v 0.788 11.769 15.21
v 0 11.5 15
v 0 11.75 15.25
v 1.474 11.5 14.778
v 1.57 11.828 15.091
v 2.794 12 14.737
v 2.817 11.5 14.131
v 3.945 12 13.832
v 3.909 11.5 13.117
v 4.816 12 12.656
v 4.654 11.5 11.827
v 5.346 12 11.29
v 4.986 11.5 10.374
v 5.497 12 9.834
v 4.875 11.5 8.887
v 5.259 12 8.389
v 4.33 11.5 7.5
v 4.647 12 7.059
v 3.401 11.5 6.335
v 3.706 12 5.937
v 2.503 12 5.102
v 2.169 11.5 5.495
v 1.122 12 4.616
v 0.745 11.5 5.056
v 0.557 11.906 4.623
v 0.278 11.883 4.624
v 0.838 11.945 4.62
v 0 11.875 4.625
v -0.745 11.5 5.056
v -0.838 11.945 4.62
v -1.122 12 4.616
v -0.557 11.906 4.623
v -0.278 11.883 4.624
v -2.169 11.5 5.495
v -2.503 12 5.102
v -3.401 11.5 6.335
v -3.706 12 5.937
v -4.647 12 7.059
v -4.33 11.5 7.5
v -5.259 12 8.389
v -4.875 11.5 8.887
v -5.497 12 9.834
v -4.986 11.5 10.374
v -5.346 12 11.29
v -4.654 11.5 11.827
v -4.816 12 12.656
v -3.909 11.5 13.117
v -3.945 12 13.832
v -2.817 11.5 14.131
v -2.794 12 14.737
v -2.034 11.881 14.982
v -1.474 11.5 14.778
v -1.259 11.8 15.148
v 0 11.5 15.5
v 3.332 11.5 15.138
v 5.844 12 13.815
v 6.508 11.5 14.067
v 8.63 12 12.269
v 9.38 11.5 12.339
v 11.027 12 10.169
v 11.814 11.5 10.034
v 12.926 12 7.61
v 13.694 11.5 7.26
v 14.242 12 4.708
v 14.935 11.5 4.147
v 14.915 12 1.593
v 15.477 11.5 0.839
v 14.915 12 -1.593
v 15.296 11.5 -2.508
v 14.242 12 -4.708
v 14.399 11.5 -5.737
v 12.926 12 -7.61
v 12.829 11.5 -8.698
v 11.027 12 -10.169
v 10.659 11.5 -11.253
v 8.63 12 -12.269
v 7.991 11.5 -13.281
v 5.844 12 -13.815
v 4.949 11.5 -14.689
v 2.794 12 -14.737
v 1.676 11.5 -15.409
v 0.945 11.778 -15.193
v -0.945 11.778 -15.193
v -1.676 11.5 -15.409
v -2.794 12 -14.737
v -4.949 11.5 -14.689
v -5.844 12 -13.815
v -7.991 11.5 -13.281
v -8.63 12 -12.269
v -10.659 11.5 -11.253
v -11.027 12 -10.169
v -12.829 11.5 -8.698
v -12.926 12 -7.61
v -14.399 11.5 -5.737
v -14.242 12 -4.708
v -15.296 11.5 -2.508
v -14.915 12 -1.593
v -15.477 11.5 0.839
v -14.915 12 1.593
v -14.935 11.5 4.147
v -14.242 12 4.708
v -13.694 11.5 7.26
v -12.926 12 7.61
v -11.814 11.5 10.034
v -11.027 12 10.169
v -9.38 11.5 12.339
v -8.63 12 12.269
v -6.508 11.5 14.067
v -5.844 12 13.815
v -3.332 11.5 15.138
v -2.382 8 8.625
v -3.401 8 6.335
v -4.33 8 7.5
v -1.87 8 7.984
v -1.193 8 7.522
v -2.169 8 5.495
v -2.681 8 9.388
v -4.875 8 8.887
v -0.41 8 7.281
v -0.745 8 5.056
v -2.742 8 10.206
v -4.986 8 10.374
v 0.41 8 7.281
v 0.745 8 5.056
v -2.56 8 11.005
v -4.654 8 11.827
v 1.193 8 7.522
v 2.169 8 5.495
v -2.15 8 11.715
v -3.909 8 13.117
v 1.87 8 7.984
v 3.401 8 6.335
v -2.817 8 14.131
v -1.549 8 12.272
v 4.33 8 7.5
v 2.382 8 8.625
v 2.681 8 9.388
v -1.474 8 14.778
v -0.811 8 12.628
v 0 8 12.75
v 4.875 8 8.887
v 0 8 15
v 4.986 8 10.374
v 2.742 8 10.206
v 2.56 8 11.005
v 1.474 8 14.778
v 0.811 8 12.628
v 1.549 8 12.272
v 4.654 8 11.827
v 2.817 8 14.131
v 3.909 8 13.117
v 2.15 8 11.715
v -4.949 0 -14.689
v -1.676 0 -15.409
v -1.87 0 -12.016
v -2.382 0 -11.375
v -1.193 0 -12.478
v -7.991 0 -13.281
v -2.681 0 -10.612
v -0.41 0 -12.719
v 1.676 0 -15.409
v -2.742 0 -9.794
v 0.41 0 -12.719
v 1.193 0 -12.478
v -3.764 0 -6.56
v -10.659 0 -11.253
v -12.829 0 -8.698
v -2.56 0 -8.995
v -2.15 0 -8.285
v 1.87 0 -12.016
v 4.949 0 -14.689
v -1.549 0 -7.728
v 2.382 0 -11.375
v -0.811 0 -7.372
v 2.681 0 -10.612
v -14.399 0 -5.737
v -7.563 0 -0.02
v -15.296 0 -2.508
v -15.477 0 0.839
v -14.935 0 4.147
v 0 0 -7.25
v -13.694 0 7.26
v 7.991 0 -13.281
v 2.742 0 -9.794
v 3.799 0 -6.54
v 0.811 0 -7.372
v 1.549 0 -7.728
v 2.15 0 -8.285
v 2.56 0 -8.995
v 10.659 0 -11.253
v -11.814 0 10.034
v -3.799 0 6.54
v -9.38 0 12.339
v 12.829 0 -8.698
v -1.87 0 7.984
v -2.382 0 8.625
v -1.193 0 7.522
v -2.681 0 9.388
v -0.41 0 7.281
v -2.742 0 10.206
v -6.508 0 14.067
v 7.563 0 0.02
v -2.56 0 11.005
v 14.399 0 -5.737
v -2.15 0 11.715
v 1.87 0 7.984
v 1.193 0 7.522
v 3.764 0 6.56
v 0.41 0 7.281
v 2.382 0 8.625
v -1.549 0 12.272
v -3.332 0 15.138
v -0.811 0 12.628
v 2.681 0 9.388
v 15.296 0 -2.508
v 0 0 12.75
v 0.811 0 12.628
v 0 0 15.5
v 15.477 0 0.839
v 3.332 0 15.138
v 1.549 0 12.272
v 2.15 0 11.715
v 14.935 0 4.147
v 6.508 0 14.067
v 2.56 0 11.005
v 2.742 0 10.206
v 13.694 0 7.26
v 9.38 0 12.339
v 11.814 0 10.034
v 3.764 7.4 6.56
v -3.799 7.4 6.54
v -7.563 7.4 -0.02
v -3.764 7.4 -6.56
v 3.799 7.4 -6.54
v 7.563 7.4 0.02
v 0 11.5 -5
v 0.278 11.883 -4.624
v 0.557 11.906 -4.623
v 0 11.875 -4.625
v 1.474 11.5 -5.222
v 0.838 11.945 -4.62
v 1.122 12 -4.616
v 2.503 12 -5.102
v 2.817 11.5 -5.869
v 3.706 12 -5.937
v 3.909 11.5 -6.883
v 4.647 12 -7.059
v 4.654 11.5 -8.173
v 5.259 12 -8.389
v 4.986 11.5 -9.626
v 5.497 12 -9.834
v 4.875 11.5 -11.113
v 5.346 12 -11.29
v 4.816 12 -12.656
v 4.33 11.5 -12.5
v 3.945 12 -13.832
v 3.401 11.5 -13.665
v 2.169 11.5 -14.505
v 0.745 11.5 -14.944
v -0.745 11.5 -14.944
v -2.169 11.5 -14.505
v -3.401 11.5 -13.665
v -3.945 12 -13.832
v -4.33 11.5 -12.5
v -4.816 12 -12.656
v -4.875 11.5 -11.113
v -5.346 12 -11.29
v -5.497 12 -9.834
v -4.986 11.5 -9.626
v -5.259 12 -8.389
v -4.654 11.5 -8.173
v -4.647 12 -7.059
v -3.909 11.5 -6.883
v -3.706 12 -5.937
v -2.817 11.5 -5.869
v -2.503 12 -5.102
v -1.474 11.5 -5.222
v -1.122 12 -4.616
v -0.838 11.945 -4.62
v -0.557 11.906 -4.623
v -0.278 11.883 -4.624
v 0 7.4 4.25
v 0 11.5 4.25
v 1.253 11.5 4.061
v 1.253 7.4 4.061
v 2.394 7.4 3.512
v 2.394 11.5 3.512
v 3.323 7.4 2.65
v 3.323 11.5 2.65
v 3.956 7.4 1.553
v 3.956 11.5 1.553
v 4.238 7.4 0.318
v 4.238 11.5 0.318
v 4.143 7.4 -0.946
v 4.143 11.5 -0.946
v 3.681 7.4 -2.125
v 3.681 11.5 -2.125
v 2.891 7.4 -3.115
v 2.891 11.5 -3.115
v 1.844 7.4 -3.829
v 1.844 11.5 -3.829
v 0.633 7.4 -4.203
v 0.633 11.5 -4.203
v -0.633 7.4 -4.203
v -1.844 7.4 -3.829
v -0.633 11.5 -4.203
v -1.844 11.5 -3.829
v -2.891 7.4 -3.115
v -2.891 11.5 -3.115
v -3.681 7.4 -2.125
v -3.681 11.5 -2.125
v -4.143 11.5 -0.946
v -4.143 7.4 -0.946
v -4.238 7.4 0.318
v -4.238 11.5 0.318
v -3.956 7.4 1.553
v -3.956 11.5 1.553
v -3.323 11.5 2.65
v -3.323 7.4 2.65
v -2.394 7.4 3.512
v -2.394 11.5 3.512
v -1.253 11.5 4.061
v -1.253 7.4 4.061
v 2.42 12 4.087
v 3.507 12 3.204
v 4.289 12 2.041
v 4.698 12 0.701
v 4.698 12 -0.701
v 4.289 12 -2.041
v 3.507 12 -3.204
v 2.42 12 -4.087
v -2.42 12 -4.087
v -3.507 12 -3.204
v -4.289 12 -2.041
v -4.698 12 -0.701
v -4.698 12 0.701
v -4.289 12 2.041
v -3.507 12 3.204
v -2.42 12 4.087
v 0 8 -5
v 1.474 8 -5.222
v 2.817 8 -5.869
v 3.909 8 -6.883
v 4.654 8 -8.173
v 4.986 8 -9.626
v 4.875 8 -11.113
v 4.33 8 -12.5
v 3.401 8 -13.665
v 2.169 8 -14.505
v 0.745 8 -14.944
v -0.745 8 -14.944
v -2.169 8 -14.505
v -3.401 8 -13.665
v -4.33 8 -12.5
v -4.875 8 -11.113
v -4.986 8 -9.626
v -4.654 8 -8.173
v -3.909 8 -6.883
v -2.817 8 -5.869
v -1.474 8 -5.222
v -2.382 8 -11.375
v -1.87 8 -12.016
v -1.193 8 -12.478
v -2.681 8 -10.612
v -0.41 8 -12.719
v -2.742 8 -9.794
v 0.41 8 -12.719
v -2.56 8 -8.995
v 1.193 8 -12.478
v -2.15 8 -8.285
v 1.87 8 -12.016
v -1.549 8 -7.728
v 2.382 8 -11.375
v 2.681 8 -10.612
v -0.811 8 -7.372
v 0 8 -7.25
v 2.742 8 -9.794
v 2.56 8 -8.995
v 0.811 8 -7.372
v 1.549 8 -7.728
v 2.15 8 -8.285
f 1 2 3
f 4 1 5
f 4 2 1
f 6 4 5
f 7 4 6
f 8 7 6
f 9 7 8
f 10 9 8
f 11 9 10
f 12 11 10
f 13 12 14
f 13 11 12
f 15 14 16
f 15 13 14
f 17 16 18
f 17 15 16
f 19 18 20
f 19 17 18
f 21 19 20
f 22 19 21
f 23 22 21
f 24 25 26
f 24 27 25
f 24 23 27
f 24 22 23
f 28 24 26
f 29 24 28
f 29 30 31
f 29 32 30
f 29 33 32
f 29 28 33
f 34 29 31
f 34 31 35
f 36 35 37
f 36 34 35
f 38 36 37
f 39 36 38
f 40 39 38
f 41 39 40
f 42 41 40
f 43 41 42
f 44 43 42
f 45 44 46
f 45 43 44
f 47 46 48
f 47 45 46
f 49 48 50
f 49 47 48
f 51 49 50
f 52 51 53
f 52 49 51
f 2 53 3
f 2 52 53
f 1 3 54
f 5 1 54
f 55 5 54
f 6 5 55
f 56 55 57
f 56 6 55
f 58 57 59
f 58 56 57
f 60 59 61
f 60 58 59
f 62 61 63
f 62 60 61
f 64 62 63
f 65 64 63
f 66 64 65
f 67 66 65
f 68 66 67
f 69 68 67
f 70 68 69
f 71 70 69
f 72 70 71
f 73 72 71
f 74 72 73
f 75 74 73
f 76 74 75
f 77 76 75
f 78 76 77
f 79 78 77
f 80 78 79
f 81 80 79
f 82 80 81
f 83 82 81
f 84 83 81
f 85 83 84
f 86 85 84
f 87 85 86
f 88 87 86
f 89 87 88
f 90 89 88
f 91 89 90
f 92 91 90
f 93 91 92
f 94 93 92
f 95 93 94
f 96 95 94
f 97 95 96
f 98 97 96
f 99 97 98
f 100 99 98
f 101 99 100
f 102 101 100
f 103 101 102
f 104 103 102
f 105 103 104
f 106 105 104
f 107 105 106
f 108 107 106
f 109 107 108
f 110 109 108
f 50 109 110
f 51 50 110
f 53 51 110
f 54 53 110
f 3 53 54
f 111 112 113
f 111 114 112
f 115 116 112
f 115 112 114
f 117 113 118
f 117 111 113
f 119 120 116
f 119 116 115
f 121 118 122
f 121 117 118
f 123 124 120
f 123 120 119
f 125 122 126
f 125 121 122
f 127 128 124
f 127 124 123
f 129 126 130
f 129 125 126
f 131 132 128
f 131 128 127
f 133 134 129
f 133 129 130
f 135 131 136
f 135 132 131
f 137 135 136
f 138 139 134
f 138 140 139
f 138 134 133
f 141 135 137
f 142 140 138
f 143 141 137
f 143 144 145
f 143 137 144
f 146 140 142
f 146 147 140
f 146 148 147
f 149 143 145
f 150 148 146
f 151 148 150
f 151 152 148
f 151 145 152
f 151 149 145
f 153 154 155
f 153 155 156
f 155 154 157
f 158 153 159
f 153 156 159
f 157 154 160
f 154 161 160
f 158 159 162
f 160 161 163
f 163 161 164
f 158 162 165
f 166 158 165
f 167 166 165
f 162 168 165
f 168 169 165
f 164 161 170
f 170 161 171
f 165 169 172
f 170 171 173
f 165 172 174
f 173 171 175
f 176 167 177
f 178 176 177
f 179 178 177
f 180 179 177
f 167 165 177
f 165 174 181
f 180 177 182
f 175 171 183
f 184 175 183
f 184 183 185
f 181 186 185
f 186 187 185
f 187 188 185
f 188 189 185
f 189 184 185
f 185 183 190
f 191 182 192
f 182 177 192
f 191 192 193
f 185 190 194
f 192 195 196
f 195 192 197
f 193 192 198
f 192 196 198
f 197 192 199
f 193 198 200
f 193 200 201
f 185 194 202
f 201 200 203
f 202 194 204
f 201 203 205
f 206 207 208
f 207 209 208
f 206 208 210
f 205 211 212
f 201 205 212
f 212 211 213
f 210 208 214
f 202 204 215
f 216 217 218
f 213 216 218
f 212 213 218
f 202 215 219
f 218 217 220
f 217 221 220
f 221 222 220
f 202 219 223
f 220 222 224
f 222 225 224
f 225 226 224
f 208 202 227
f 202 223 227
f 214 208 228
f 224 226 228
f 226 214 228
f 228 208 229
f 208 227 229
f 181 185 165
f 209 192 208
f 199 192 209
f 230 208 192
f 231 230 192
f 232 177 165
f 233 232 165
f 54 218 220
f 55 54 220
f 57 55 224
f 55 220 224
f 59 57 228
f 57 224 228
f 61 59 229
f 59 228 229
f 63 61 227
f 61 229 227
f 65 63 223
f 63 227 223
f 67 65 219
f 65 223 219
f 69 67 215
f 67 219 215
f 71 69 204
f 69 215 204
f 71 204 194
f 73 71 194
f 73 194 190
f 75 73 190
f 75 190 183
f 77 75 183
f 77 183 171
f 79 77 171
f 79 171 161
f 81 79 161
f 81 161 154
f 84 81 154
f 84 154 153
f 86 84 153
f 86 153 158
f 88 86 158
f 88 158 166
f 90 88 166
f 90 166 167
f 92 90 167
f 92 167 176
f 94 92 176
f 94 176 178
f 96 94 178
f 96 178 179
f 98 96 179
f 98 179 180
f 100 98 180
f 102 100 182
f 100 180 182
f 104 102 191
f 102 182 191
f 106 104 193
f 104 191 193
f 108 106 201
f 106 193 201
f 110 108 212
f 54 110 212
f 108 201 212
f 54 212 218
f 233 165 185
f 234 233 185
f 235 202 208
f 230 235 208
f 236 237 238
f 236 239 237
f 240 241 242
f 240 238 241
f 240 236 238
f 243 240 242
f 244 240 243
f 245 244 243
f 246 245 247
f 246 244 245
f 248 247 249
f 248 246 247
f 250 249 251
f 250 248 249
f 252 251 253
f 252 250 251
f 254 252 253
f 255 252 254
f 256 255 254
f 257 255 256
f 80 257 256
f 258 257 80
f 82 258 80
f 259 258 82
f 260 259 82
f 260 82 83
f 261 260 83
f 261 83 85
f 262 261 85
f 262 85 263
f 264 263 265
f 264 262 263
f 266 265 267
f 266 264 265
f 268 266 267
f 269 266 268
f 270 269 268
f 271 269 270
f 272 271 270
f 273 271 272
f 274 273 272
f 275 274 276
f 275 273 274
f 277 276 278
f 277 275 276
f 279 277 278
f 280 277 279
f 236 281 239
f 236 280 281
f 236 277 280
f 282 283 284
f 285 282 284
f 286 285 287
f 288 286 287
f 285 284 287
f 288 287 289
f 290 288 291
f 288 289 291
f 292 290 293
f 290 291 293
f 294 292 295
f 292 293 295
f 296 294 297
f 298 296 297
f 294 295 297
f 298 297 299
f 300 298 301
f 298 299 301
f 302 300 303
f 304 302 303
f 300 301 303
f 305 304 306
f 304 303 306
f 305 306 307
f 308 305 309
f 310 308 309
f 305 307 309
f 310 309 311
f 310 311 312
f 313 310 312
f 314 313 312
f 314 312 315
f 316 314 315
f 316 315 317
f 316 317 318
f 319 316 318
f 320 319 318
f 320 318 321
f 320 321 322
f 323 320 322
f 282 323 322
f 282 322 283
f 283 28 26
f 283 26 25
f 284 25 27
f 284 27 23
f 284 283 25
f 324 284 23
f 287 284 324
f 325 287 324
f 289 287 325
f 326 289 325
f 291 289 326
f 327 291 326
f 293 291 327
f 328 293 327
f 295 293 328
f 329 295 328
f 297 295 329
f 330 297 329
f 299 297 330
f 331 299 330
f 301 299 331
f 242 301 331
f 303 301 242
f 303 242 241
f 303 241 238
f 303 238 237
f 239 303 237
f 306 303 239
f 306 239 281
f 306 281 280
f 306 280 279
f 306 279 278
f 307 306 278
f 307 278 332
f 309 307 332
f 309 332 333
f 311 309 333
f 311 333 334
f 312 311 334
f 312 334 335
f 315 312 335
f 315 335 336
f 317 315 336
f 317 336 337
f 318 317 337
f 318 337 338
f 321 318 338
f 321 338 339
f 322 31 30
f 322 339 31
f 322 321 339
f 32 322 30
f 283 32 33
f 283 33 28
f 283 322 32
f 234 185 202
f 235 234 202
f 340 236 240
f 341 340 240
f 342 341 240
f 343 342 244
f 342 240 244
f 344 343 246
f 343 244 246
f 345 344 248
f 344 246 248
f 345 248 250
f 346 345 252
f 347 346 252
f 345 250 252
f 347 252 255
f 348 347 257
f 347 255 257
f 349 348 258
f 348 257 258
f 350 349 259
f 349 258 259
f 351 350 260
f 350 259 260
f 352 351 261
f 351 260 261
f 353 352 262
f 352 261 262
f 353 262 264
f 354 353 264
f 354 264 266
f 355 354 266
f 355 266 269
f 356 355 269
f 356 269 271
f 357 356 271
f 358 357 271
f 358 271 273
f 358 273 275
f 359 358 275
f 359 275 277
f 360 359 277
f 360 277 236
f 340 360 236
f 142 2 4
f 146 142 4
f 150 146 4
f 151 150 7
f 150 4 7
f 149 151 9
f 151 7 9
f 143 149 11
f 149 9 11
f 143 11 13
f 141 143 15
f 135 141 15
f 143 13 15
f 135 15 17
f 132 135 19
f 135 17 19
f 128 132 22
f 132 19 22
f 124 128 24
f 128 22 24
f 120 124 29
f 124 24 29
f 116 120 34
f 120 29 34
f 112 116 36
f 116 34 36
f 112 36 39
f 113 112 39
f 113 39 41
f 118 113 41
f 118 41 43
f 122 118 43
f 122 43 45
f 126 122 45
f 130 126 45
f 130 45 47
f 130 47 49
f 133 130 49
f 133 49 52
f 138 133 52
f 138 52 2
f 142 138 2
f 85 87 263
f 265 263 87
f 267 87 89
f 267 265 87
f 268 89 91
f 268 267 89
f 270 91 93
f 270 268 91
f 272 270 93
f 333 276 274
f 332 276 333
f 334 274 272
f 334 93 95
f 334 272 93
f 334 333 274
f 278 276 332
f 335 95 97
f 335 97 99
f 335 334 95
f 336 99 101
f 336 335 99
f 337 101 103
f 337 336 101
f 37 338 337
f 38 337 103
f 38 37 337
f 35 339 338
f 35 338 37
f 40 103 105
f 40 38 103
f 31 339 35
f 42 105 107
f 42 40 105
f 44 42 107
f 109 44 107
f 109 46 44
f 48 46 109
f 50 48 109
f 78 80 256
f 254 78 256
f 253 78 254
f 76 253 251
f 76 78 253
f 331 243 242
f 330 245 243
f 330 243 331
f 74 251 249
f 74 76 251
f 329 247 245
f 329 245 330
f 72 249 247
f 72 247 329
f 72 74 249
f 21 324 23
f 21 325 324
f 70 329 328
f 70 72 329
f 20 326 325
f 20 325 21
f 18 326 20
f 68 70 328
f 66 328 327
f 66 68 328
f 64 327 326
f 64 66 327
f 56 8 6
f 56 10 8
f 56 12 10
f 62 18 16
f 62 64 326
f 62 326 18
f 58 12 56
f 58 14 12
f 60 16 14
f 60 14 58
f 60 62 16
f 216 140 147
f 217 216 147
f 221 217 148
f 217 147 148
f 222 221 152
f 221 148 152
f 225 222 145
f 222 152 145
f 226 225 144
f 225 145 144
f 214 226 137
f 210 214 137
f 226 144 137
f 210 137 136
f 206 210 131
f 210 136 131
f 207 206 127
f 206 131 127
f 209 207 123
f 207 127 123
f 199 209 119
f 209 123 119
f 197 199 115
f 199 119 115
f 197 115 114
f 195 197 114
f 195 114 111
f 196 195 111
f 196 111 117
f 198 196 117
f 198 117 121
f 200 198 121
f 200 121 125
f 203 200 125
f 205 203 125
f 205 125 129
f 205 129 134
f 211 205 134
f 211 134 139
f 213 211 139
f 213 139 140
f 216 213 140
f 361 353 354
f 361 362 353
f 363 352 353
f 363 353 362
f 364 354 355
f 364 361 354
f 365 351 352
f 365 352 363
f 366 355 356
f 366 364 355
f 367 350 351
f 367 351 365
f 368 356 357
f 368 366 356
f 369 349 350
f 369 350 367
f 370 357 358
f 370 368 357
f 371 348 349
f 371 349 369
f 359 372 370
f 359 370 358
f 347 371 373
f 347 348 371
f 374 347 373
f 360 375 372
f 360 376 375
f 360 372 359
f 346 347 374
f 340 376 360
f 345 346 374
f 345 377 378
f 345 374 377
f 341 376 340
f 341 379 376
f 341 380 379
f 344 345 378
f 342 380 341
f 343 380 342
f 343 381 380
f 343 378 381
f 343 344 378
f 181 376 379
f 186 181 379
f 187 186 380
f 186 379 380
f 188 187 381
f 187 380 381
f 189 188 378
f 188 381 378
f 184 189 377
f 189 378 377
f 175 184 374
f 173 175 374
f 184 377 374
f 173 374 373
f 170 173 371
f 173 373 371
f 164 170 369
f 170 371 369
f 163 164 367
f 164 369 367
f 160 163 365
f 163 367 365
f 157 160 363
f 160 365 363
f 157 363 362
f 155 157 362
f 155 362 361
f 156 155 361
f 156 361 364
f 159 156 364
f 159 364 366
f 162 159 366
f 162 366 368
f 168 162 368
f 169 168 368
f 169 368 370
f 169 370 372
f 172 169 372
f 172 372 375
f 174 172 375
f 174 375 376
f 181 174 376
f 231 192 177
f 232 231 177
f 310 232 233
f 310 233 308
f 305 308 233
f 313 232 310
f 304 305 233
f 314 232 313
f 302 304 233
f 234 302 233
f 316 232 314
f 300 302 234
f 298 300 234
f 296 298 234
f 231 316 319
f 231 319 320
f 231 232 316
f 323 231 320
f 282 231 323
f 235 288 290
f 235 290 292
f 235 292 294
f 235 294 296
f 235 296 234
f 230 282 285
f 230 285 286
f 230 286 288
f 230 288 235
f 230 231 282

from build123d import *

# Parameters (mm, degrees)
SKETCH1_R           = 15.5
BOSS_EXTRUDE1_DEPTH = 12
SKETCH2_R           = 2.75
CUT_EXTRUDE1_DEPTH  = 25.989997999
SKETCH3_R           = 4.25
CUT_EXTRUDE2_DEPTH  = 25.989997999
CUT_EXTRUDE3_DEPTH  = 7.4
SKETCH5_R           = 5
CUT_EXTRUDE4_DEPTH  = 4
CHAMFER1_SIZE       = 0.5


with BuildPart() as part:
    # Sketch1 → Boss-Extrude1 (new body)
    with BuildSketch(Plane(origin=(0, 0, 0), x_dir=(1, 0, 0), z_dir=(0, 1, 0))):
        with Locations(Location((0, 0, 0), (0, 0, 270))):
            Circle(SKETCH1_R)
    extrude(amount=BOSS_EXTRUDE1_DEPTH)

    # Sketch2 → Cut-Extrude1 (cut, through all)
    with BuildSketch(Plane(origin=(0, 12, 0), x_dir=(1, 0, 0), z_dir=(0, 1, 0))):
        with Locations(Location((0, 10, 0), (0, 0, 270))):
            Circle(SKETCH2_R)
        with Locations(Location((0, -10, 0), (0, 0, 270))):
            Circle(SKETCH2_R)
    extrude(amount=-CUT_EXTRUDE1_DEPTH, mode=Mode.SUBTRACT)

    # Sketch3 → Cut-Extrude2 (cut, through all)
    with BuildSketch(Plane(origin=(0, 12, 0), x_dir=(1, 0, 0), z_dir=(0, 1, 0))):
        with Locations(Location((0, 0, 0), (0, 0, 270))):
            Circle(SKETCH3_R)
    extrude(amount=-CUT_EXTRUDE2_DEPTH, mode=Mode.SUBTRACT)

    # Sketch4 → Cut-Extrude3 (cut)
    with BuildSketch(Plane.XZ):
        Polygon((3.798941201, -6.539983111), (7.563262114, 0.019988032), (3.764320914, 6.559971143), (-3.798941201, 6.539983111), (-7.563262114, -0.019988032), (-3.764320914, -6.559971143), align=None)
    extrude(amount=-CUT_EXTRUDE3_DEPTH, mode=Mode.SUBTRACT)

    # Sketch5 → Cut-Extrude4 (cut)
    with BuildSketch(Plane(origin=(0, 12, 0), x_dir=(1, 0, 0), z_dir=(0, 1, 0))):
        with Locations(Location((0, 10, 0), (0, 0, 270))):
            Circle(SKETCH5_R)
        with Locations(Location((0, -10, 0), (0, 0, 270))):
            Circle(SKETCH5_R)
    extrude(amount=-CUT_EXTRUDE4_DEPTH, mode=Mode.SUBTRACT)

    # Chamfer1
    # the kernel refuses this chamfer: 0.5 mm, written as the material it takes off along each edge
    with BuildSketch(Plane(origin=(0, 12, 0), x_dir=(0, 0, 1), z_dir=(-1, 0, 0))) as chamfer1_piece_1:
        Polygon((4.25 + CHAMFER1_SIZE, 0), (4.25, -CHAMFER1_SIZE), (4.25, 0), align=None)
    revolve(axis=Axis((0, 12, 0), (0, 1, 0)), mode=Mode.SUBTRACT)
    with BuildSketch(Plane(origin=(0, 12, 0), x_dir=(0, 0, 1), z_dir=(-1, 0, 0))) as chamfer1_piece_2:
        Polygon((15.5, -CHAMFER1_SIZE), (15.5 - CHAMFER1_SIZE, 0), (15.5, 0), align=None)
    revolve(axis=Axis((0, 12, 0), (0, 1, 0)), mode=Mode.SUBTRACT)
    with BuildSketch(Plane(origin=(0, 12, -10), x_dir=(0, 0, 1), z_dir=(-1, 0, 0))) as chamfer1_piece_3:
        Polygon((5 + CHAMFER1_SIZE, 0), (5, -CHAMFER1_SIZE), (5, 0), align=None)
    revolve(axis=Axis((0, 12, -10), (0, 1, 0)), mode=Mode.SUBTRACT)
    with BuildSketch(Plane(origin=(0, 12, 10), x_dir=(0, 0, 1), z_dir=(-1, 0, 0))) as chamfer1_piece_4:
        Polygon((5 + CHAMFER1_SIZE, 0), (5, -CHAMFER1_SIZE), (5, 0), align=None)
    revolve(axis=Axis((0, 12, 10), (0, 1, 0)), mode=Mode.SUBTRACT)


solid = part.part
